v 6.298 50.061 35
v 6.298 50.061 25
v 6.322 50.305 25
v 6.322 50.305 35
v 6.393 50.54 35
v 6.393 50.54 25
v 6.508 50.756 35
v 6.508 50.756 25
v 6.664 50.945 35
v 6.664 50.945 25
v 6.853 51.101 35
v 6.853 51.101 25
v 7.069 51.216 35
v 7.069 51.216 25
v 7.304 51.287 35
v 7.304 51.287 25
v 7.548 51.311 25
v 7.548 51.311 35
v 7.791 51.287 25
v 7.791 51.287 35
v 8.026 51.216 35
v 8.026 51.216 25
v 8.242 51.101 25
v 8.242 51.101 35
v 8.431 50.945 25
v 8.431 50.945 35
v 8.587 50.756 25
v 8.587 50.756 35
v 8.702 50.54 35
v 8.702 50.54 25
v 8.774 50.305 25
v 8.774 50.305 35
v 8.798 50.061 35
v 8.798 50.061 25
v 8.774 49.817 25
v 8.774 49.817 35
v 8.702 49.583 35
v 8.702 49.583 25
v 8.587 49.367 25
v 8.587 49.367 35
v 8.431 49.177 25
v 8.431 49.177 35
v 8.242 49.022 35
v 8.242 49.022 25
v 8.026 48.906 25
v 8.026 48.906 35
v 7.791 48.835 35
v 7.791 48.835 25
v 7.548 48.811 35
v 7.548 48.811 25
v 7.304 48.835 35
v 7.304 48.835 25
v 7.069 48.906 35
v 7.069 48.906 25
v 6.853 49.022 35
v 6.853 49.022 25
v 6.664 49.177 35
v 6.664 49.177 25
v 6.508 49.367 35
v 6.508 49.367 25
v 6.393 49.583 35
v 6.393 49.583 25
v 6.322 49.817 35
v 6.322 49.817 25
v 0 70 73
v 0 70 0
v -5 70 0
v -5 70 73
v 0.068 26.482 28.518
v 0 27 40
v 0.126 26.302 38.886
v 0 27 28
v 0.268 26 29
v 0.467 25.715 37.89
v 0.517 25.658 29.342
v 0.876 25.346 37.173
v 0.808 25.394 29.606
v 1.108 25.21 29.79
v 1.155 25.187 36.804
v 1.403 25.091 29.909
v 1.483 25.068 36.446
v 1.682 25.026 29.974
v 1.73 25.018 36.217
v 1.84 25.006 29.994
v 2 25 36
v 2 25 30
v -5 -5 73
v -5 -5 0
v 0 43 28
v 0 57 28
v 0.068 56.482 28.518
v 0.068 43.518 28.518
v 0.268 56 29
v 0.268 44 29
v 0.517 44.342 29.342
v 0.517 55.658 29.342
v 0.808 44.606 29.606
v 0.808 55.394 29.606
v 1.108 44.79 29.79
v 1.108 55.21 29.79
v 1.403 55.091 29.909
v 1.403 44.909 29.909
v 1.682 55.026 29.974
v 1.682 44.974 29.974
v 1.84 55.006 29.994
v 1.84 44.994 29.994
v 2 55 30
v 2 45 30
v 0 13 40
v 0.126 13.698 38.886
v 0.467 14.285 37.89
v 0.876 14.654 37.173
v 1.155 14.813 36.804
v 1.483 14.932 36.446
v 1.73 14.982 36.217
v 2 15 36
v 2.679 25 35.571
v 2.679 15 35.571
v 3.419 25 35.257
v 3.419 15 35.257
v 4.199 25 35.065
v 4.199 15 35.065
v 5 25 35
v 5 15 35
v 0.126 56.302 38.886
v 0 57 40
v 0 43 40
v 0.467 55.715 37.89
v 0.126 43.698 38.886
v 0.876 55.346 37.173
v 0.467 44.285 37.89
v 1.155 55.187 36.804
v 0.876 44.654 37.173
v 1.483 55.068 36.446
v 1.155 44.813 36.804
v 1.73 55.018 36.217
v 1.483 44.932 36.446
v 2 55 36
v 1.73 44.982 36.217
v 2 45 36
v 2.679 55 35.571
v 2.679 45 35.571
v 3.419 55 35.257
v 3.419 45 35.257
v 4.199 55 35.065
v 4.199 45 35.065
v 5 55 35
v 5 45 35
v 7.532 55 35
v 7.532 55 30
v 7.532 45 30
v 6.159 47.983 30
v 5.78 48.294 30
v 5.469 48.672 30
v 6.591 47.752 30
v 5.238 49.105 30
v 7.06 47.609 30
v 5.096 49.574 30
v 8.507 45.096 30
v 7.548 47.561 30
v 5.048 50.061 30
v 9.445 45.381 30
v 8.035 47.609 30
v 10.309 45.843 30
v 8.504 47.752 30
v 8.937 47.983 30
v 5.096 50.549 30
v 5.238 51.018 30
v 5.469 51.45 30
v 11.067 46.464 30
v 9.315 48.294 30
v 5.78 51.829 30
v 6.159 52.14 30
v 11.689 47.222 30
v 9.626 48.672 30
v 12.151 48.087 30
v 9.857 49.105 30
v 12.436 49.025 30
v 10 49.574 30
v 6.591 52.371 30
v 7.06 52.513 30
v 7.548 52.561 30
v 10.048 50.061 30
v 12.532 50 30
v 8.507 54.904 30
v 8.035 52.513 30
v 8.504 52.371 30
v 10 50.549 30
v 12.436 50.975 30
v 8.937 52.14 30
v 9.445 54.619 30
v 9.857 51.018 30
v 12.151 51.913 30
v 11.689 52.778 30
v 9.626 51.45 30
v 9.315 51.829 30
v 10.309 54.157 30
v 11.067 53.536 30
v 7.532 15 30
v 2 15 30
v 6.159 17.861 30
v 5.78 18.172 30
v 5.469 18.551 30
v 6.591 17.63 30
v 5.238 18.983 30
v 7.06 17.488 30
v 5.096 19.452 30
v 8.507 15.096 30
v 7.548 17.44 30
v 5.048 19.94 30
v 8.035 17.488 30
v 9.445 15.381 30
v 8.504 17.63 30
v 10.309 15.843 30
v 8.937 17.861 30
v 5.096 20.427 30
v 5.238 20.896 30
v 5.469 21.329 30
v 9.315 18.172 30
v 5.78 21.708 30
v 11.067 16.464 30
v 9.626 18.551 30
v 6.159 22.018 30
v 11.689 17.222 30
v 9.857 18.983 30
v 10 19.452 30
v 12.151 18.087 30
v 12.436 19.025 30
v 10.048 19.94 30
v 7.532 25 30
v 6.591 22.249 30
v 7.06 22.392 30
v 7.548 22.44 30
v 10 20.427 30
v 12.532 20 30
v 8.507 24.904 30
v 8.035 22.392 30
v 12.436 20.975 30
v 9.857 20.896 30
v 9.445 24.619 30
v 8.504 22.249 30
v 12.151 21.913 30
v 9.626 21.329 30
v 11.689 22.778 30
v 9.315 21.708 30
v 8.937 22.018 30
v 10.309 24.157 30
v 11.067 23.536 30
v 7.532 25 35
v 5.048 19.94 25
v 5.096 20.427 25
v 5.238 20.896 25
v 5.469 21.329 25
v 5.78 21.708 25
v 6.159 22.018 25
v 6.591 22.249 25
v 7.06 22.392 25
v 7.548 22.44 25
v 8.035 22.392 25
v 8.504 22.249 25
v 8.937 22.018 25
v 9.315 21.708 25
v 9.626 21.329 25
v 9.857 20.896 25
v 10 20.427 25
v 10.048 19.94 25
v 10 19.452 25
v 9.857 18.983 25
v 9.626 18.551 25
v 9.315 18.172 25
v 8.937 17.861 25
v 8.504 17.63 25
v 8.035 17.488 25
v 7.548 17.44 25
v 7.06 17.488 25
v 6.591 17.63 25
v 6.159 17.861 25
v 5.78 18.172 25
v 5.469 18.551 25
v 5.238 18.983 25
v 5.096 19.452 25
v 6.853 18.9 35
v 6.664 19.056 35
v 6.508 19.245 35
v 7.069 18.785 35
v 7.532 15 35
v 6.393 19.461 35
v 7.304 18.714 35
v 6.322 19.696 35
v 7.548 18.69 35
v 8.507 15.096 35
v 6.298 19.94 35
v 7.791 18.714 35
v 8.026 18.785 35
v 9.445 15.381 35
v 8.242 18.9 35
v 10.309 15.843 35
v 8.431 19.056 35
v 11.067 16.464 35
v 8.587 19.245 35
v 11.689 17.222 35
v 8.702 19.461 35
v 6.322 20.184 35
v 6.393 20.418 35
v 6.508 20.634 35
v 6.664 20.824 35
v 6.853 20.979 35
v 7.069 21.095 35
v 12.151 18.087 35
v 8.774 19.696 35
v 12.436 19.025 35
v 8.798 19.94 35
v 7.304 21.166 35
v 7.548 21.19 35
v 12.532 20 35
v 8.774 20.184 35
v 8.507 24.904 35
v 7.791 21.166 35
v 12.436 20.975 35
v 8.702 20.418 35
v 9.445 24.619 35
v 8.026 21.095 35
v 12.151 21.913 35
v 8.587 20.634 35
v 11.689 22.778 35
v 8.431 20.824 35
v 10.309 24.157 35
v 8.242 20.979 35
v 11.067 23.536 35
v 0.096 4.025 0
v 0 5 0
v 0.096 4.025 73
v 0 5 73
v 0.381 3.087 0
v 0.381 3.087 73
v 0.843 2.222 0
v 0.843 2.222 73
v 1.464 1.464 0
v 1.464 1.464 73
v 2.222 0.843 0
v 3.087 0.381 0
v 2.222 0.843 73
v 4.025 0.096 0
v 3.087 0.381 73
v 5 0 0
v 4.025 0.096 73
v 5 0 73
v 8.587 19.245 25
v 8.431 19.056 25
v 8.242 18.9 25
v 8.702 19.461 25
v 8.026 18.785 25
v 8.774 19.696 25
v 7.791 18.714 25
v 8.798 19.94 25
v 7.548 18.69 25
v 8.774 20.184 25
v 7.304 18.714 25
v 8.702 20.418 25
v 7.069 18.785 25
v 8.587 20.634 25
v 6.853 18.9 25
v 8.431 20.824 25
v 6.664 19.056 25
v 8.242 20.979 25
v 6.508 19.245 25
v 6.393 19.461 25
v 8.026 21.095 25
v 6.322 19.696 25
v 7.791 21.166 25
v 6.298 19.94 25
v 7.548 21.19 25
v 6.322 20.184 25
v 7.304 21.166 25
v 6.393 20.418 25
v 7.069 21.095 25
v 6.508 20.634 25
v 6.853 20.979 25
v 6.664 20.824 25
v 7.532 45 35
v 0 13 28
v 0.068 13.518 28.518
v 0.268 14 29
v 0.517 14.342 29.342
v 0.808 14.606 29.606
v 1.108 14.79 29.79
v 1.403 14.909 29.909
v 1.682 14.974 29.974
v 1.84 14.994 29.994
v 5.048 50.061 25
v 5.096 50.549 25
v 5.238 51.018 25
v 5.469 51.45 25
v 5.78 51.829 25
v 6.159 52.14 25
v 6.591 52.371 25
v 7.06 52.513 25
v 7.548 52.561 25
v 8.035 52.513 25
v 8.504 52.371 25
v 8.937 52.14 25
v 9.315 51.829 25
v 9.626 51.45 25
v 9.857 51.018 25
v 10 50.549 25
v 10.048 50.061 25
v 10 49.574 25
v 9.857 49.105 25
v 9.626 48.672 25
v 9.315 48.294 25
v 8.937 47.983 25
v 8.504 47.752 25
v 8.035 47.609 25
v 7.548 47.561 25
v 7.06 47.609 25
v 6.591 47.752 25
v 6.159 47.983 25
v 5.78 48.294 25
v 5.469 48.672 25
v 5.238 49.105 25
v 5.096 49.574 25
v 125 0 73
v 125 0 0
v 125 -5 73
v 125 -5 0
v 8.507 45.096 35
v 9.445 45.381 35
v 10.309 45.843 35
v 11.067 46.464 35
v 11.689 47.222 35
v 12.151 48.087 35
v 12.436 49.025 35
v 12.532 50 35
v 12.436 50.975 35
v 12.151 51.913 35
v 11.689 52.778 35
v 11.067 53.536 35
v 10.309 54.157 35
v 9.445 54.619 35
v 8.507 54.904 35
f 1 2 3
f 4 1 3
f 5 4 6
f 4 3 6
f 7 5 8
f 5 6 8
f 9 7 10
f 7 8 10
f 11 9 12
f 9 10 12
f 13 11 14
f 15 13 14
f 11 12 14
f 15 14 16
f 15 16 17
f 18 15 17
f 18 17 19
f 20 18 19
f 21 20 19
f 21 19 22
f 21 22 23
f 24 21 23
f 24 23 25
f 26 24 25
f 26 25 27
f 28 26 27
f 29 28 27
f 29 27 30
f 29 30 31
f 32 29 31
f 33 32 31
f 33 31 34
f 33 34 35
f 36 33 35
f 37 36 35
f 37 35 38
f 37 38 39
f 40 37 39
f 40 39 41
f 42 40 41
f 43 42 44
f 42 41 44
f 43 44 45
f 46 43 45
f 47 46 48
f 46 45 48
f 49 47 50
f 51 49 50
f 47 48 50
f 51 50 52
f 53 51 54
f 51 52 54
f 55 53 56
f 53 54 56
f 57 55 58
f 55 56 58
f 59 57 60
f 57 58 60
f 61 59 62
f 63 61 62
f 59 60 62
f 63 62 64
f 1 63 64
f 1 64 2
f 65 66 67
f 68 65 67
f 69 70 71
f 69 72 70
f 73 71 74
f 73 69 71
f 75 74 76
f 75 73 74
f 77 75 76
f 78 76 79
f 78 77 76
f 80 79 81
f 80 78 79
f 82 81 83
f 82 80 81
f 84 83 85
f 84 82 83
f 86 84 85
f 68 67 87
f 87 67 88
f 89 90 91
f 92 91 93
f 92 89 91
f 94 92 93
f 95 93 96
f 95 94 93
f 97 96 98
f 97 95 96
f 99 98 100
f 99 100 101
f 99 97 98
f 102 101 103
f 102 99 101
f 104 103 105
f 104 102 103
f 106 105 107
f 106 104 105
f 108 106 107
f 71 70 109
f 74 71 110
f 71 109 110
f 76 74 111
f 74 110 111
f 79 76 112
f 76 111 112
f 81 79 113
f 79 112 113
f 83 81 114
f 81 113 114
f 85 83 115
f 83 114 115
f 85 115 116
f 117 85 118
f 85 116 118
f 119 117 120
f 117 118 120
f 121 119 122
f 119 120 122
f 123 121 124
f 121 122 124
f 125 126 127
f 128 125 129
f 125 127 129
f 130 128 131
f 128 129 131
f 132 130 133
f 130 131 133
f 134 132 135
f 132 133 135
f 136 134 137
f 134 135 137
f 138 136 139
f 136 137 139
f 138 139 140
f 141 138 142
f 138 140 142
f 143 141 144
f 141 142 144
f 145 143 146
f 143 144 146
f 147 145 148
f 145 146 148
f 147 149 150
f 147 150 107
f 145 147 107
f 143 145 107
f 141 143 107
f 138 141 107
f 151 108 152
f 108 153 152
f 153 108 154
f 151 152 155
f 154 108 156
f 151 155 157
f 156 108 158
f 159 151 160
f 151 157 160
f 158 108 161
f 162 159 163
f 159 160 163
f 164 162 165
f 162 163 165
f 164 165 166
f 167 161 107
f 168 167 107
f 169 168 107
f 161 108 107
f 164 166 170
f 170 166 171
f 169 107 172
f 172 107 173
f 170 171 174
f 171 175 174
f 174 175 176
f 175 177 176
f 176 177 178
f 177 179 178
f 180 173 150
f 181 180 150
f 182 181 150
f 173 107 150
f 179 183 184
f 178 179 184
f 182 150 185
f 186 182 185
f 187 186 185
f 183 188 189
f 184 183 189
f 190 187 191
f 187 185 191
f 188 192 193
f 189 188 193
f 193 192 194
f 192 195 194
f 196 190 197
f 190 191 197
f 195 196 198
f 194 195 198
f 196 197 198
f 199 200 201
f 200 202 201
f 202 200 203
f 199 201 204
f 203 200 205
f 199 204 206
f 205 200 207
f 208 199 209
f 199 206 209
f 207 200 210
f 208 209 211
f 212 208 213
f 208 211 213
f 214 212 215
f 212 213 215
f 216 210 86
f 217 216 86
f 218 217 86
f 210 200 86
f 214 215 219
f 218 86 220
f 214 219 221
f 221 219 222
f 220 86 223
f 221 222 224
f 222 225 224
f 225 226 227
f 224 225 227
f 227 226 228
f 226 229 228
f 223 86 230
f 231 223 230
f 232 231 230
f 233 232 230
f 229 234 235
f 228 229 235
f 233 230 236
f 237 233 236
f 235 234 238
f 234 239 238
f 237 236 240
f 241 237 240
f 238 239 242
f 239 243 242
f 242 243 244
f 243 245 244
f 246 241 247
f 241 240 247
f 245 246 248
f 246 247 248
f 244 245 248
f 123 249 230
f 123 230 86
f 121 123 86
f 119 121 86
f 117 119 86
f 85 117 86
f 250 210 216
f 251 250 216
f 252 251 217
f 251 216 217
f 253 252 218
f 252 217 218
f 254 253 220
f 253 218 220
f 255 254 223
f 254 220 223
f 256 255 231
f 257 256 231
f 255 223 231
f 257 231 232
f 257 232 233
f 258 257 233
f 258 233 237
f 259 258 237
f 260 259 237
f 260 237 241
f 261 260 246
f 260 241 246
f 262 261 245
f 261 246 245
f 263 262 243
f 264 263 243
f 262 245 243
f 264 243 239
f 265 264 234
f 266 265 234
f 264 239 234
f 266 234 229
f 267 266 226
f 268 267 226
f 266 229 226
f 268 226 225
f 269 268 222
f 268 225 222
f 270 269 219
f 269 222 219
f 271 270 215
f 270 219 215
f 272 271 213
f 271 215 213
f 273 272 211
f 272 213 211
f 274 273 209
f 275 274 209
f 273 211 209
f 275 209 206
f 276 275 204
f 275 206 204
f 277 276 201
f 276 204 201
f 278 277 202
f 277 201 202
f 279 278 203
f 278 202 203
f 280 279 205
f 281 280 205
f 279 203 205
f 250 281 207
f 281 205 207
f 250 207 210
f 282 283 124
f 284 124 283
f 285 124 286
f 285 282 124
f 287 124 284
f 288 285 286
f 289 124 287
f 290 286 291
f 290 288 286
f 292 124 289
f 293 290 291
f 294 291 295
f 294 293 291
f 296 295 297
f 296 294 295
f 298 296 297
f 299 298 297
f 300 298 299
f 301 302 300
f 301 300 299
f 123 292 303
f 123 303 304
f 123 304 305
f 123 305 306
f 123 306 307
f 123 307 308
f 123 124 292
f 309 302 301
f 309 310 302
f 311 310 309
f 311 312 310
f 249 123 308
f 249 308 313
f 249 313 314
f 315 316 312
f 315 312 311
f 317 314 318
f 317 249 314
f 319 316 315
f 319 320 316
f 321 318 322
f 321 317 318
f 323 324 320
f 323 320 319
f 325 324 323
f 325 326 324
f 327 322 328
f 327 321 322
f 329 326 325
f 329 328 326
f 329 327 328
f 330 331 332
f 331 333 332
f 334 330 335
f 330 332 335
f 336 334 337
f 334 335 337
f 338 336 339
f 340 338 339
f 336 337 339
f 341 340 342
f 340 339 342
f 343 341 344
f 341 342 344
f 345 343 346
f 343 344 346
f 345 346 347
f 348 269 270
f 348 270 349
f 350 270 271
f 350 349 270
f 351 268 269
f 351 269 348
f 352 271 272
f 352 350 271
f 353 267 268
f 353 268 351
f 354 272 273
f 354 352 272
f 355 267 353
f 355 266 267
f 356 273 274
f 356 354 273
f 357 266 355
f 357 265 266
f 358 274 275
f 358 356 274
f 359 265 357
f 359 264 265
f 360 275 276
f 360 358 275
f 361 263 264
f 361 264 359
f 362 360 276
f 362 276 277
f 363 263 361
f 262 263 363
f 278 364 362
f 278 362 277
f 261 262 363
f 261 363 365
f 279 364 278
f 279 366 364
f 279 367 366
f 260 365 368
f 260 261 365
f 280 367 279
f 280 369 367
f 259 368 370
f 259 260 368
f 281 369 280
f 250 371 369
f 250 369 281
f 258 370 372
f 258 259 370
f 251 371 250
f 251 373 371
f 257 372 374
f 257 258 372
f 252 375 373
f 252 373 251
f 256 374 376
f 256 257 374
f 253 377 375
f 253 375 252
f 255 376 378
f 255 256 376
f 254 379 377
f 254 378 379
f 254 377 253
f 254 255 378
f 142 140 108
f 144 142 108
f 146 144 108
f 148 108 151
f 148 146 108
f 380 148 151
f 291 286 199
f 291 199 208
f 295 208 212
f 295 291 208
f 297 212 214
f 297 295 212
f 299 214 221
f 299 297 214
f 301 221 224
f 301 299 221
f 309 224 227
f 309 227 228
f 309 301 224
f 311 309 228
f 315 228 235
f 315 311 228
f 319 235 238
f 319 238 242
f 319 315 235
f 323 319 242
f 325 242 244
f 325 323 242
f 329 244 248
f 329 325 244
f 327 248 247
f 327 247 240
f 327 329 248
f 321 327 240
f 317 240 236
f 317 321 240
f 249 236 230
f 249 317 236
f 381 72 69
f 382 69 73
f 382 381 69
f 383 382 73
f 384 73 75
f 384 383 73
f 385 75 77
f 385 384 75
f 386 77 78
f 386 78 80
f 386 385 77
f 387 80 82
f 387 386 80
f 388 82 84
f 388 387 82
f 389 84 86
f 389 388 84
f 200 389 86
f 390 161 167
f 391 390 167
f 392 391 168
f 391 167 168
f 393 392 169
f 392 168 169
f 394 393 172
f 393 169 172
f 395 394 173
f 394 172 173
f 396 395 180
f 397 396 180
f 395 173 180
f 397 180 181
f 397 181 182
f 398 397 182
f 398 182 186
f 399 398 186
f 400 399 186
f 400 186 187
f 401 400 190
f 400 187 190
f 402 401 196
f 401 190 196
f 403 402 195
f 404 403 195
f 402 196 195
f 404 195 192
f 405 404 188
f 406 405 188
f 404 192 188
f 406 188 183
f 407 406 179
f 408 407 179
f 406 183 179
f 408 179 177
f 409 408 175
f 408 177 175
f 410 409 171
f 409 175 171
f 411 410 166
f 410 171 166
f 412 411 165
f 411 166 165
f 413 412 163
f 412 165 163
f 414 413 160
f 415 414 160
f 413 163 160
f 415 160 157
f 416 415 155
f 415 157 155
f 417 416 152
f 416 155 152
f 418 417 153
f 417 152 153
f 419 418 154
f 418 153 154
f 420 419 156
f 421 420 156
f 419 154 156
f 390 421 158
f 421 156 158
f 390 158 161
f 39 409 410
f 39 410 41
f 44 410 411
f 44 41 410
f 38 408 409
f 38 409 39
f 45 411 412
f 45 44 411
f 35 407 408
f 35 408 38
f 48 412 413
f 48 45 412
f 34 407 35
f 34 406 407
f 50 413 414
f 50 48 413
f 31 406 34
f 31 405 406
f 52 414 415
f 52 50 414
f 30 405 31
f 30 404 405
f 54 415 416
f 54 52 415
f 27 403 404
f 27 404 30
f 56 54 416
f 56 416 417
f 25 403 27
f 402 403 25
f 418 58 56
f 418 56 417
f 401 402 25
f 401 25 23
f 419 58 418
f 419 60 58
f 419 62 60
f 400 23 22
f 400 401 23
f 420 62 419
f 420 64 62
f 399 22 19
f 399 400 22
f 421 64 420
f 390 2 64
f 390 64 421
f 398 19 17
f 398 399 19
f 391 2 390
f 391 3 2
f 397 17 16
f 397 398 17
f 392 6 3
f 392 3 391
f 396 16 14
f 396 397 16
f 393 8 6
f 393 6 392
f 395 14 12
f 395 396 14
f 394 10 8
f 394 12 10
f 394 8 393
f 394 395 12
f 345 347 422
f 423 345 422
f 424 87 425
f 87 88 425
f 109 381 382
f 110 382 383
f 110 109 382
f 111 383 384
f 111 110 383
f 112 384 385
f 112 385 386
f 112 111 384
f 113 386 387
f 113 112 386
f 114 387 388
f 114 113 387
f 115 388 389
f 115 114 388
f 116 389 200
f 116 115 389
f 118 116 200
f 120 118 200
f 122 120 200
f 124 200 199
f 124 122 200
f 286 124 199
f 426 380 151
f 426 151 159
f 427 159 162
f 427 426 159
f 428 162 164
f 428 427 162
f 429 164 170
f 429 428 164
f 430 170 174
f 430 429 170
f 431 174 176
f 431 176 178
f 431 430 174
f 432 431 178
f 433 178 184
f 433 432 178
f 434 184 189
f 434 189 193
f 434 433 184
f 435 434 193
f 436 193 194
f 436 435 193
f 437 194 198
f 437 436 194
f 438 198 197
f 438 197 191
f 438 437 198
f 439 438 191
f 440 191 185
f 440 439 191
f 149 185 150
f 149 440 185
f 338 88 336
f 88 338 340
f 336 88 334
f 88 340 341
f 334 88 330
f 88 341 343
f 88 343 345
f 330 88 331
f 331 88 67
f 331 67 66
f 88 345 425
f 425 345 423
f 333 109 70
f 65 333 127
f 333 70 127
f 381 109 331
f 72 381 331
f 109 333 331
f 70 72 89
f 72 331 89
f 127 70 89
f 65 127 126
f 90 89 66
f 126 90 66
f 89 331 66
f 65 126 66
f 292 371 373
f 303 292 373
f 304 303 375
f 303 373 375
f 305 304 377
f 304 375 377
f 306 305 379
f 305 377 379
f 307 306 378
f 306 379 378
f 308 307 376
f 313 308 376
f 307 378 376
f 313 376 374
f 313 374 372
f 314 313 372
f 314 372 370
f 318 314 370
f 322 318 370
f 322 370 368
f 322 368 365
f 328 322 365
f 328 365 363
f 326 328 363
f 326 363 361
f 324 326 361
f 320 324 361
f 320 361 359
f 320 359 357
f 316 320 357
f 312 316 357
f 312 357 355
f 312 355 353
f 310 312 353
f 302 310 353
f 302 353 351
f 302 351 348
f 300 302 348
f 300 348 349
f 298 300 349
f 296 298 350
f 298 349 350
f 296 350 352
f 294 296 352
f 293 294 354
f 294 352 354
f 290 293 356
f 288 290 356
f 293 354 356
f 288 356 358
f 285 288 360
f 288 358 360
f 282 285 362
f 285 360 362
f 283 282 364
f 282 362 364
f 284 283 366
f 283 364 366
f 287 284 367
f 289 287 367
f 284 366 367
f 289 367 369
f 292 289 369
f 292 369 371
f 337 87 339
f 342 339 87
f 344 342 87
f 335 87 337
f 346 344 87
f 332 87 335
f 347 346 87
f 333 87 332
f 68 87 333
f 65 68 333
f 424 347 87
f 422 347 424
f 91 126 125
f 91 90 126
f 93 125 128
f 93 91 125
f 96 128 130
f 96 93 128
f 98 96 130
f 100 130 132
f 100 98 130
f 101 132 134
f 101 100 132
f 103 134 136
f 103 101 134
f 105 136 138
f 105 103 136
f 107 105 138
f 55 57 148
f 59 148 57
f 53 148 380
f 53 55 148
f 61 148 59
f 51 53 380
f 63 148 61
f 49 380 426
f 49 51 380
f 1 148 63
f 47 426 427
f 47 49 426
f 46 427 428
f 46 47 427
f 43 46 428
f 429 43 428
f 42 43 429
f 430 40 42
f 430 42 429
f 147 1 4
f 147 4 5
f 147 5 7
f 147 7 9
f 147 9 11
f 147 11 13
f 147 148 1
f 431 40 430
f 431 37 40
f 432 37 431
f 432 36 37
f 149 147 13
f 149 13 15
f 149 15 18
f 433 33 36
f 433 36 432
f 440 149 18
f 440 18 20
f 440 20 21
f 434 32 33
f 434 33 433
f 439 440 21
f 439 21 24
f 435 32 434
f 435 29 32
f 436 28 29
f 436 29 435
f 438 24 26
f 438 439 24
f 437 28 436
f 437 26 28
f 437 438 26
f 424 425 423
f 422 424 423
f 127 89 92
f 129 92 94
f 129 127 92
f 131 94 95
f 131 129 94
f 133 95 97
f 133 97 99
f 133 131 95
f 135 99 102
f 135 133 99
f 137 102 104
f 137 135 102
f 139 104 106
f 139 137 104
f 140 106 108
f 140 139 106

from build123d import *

# Parameters (mm, degrees)
SCHIZZO1_W                   = 5
SCHIZZO1_H                   = 70
ESTRUSIONE_ESTRUSIONE1_DEPTH = 70
ESTRUSIONE_ESTRUSIONE2_START = -35
ESTRUSIONE_ESTRUSIONE2_DEPTH = 5
SCHIZZO3_R                   = 2.5
ESTRUSIONE_ESTRUSIONE3_DEPTH = 5
SCHIZZO4_W                   = 130
SCHIZZO4_H                   = 70
ESTRUSIONE_ESTRUSIONE4_DEPTH = 5
SCHIZZO5_R                   = 1.25
TAGLIO_ESTRUSIONE1_DEPTH     = 46
ESTRUSIONE_ESTRUSIONE5_DEPTH = 3
RACCORDO1_R                  = 5
RACCORDO2_R                  = 5
RACCORDO3_R                  = 2
RACCORDO4_R                  = 2
TAGLIO_ESTRUSIONE2_REACH     = 75


with BuildPart() as part:
    # Schizzo1 → Estrusione-Estrusione1 (new body)
    with BuildSketch(Plane.XY):
        with Locations((-2.5, 35)):
            Rectangle(SCHIZZO1_W, SCHIZZO1_H)
    extrude(amount=ESTRUSIONE_ESTRUSIONE1_DEPTH)

    # Schizzo2 → Estrusione-Estrusione2 (add)
    with BuildSketch(Plane.XY.offset(70).offset(ESTRUSIONE_ESTRUSIONE2_START)):
        with BuildLine():
            Line((0, 50), (0, 45))
            Line((0, 45), (7.531619243, 45))
            ThreePointArc((7.531619243, 45), (12.531619243, 50), (7.531619243, 55))
            Line((7.531619243, 55), (0, 55))
            Line((0, 55), (0, 50))
        make_face()
        with BuildLine():
            Line((0, 20), (0, 15))
            Line((0, 15), (7.531619243, 15))
            ThreePointArc((7.531619243, 15), (12.531619243, 20), (7.531619243, 25))
            Line((7.531619243, 25), (0, 25))
            Line((0, 25), (0, 20))
        make_face()
    extrude(amount=-ESTRUSIONE_ESTRUSIONE2_DEPTH)

    # Schizzo3 → Estrusione-Estrusione3 (add)
    with BuildSketch(Plane(origin=(0, 0, 30), x_dir=(-1, 0, 0), z_dir=(0, 0, -1))):
        with Locations((-7.547600082, 50.061310314)):
            Circle(SCHIZZO3_R)
        with Locations((-7.547600082, 19.939772921)):
            Circle(SCHIZZO3_R)
    extrude(amount=ESTRUSIONE_ESTRUSIONE3_DEPTH)

    # Schizzo4 → Estrusione-Estrusione4 (add)
    with BuildSketch(Plane.XZ):
        with Locations((60, 35)):
            Rectangle(SCHIZZO4_W, SCHIZZO4_H)
    extrude(amount=ESTRUSIONE_ESTRUSIONE4_DEPTH)

    # Schizzo5 → Taglio-Estrusione1 (cut, through all)
    with BuildSketch(Plane(origin=(0, 0, 25), x_dir=(-1, 0, 0), z_dir=(0, 0, -1))):
        with Locations((-7.547600082, 50.061310314)):
            Circle(SCHIZZO5_R)
        with Locations((-7.547600082, 19.939772921)):
            Circle(SCHIZZO5_R)
    extrude(amount=-TAGLIO_ESTRUSIONE1_DEPTH, mode=Mode.SUBTRACT)

    # Schizzo6 → Estrusione-Estrusione5 (add)
    with BuildSketch(Plane.XY.offset(70)):
        Polygon((125, 0), (0, 0), (0, 70), (-5, 70), (-5, -5), (125, -5), align=None)
        Polygon((0, 70), (125, 0), (0, 0), align=None)
    extrude(amount=ESTRUSIONE_ESTRUSIONE5_DEPTH)

    # Raccordo1
    raccordo1_edges = [part.edges().sort_by_distance(p)[0] for p in [
        (0, 35, 70),
        (62.5, 0, 70),
        (0, 0, 35),
    ]]
    fillet(raccordo1_edges, radius=RACCORDO1_R)

    # Raccordo2
    raccordo2_edges = [part.edges().sort_by_distance(p)[0] for p in [
        (0, 50, 35),
        (0, 20, 35),
    ]]
    fillet(raccordo2_edges, radius=RACCORDO2_R)

    # Raccordo3
    raccordo3_edges = [part.edges().sort_by_distance(p)[0] for p in [
        (0, 50, 30),
        (0, 20, 30),
    ]]
    fillet(raccordo3_edges, radius=RACCORDO3_R)

    # Raccordo4
    raccordo4_edges = [part.edges().sort_by_distance(p)[0] for p in [
        (0, 25, 32.5),
        (0, 15, 32.5),
        (0, 45, 32.5),
        (0, 55, 32.5),
    ]]
    fillet(raccordo4_edges, radius=RACCORDO4_R)

    # Schizzo7 → Taglio-Estrusione2 (cut, up to next)
    with BuildSketch(Plane(origin=(0, 0, 73), x_dir=(-1, 0, 0), z_dir=(0, 0, -1)), mode=Mode.PRIVATE) as taglio_estrusione2_sk1:
        with BuildLine():
            ThreePointArc((-5, 0), (-1.464466094, 1.464466094), (0, 5))
            Line((0, 5), (0, 70))
            Line((0, 70), (-125, 0))
            Line((-125, 0), (-5, 0))
        make_face()
    taglio_estrusione2_tool1 = extrude(taglio_estrusione2_sk1.sketch, amount=TAGLIO_ESTRUSIONE2_REACH, mode=Mode.PRIVATE) & part.part
    add(taglio_estrusione2_tool1.solids().sort_by_distance((41.716454, 23.360611, 73))[0], mode=Mode.SUBTRACT)


solid = part.part
